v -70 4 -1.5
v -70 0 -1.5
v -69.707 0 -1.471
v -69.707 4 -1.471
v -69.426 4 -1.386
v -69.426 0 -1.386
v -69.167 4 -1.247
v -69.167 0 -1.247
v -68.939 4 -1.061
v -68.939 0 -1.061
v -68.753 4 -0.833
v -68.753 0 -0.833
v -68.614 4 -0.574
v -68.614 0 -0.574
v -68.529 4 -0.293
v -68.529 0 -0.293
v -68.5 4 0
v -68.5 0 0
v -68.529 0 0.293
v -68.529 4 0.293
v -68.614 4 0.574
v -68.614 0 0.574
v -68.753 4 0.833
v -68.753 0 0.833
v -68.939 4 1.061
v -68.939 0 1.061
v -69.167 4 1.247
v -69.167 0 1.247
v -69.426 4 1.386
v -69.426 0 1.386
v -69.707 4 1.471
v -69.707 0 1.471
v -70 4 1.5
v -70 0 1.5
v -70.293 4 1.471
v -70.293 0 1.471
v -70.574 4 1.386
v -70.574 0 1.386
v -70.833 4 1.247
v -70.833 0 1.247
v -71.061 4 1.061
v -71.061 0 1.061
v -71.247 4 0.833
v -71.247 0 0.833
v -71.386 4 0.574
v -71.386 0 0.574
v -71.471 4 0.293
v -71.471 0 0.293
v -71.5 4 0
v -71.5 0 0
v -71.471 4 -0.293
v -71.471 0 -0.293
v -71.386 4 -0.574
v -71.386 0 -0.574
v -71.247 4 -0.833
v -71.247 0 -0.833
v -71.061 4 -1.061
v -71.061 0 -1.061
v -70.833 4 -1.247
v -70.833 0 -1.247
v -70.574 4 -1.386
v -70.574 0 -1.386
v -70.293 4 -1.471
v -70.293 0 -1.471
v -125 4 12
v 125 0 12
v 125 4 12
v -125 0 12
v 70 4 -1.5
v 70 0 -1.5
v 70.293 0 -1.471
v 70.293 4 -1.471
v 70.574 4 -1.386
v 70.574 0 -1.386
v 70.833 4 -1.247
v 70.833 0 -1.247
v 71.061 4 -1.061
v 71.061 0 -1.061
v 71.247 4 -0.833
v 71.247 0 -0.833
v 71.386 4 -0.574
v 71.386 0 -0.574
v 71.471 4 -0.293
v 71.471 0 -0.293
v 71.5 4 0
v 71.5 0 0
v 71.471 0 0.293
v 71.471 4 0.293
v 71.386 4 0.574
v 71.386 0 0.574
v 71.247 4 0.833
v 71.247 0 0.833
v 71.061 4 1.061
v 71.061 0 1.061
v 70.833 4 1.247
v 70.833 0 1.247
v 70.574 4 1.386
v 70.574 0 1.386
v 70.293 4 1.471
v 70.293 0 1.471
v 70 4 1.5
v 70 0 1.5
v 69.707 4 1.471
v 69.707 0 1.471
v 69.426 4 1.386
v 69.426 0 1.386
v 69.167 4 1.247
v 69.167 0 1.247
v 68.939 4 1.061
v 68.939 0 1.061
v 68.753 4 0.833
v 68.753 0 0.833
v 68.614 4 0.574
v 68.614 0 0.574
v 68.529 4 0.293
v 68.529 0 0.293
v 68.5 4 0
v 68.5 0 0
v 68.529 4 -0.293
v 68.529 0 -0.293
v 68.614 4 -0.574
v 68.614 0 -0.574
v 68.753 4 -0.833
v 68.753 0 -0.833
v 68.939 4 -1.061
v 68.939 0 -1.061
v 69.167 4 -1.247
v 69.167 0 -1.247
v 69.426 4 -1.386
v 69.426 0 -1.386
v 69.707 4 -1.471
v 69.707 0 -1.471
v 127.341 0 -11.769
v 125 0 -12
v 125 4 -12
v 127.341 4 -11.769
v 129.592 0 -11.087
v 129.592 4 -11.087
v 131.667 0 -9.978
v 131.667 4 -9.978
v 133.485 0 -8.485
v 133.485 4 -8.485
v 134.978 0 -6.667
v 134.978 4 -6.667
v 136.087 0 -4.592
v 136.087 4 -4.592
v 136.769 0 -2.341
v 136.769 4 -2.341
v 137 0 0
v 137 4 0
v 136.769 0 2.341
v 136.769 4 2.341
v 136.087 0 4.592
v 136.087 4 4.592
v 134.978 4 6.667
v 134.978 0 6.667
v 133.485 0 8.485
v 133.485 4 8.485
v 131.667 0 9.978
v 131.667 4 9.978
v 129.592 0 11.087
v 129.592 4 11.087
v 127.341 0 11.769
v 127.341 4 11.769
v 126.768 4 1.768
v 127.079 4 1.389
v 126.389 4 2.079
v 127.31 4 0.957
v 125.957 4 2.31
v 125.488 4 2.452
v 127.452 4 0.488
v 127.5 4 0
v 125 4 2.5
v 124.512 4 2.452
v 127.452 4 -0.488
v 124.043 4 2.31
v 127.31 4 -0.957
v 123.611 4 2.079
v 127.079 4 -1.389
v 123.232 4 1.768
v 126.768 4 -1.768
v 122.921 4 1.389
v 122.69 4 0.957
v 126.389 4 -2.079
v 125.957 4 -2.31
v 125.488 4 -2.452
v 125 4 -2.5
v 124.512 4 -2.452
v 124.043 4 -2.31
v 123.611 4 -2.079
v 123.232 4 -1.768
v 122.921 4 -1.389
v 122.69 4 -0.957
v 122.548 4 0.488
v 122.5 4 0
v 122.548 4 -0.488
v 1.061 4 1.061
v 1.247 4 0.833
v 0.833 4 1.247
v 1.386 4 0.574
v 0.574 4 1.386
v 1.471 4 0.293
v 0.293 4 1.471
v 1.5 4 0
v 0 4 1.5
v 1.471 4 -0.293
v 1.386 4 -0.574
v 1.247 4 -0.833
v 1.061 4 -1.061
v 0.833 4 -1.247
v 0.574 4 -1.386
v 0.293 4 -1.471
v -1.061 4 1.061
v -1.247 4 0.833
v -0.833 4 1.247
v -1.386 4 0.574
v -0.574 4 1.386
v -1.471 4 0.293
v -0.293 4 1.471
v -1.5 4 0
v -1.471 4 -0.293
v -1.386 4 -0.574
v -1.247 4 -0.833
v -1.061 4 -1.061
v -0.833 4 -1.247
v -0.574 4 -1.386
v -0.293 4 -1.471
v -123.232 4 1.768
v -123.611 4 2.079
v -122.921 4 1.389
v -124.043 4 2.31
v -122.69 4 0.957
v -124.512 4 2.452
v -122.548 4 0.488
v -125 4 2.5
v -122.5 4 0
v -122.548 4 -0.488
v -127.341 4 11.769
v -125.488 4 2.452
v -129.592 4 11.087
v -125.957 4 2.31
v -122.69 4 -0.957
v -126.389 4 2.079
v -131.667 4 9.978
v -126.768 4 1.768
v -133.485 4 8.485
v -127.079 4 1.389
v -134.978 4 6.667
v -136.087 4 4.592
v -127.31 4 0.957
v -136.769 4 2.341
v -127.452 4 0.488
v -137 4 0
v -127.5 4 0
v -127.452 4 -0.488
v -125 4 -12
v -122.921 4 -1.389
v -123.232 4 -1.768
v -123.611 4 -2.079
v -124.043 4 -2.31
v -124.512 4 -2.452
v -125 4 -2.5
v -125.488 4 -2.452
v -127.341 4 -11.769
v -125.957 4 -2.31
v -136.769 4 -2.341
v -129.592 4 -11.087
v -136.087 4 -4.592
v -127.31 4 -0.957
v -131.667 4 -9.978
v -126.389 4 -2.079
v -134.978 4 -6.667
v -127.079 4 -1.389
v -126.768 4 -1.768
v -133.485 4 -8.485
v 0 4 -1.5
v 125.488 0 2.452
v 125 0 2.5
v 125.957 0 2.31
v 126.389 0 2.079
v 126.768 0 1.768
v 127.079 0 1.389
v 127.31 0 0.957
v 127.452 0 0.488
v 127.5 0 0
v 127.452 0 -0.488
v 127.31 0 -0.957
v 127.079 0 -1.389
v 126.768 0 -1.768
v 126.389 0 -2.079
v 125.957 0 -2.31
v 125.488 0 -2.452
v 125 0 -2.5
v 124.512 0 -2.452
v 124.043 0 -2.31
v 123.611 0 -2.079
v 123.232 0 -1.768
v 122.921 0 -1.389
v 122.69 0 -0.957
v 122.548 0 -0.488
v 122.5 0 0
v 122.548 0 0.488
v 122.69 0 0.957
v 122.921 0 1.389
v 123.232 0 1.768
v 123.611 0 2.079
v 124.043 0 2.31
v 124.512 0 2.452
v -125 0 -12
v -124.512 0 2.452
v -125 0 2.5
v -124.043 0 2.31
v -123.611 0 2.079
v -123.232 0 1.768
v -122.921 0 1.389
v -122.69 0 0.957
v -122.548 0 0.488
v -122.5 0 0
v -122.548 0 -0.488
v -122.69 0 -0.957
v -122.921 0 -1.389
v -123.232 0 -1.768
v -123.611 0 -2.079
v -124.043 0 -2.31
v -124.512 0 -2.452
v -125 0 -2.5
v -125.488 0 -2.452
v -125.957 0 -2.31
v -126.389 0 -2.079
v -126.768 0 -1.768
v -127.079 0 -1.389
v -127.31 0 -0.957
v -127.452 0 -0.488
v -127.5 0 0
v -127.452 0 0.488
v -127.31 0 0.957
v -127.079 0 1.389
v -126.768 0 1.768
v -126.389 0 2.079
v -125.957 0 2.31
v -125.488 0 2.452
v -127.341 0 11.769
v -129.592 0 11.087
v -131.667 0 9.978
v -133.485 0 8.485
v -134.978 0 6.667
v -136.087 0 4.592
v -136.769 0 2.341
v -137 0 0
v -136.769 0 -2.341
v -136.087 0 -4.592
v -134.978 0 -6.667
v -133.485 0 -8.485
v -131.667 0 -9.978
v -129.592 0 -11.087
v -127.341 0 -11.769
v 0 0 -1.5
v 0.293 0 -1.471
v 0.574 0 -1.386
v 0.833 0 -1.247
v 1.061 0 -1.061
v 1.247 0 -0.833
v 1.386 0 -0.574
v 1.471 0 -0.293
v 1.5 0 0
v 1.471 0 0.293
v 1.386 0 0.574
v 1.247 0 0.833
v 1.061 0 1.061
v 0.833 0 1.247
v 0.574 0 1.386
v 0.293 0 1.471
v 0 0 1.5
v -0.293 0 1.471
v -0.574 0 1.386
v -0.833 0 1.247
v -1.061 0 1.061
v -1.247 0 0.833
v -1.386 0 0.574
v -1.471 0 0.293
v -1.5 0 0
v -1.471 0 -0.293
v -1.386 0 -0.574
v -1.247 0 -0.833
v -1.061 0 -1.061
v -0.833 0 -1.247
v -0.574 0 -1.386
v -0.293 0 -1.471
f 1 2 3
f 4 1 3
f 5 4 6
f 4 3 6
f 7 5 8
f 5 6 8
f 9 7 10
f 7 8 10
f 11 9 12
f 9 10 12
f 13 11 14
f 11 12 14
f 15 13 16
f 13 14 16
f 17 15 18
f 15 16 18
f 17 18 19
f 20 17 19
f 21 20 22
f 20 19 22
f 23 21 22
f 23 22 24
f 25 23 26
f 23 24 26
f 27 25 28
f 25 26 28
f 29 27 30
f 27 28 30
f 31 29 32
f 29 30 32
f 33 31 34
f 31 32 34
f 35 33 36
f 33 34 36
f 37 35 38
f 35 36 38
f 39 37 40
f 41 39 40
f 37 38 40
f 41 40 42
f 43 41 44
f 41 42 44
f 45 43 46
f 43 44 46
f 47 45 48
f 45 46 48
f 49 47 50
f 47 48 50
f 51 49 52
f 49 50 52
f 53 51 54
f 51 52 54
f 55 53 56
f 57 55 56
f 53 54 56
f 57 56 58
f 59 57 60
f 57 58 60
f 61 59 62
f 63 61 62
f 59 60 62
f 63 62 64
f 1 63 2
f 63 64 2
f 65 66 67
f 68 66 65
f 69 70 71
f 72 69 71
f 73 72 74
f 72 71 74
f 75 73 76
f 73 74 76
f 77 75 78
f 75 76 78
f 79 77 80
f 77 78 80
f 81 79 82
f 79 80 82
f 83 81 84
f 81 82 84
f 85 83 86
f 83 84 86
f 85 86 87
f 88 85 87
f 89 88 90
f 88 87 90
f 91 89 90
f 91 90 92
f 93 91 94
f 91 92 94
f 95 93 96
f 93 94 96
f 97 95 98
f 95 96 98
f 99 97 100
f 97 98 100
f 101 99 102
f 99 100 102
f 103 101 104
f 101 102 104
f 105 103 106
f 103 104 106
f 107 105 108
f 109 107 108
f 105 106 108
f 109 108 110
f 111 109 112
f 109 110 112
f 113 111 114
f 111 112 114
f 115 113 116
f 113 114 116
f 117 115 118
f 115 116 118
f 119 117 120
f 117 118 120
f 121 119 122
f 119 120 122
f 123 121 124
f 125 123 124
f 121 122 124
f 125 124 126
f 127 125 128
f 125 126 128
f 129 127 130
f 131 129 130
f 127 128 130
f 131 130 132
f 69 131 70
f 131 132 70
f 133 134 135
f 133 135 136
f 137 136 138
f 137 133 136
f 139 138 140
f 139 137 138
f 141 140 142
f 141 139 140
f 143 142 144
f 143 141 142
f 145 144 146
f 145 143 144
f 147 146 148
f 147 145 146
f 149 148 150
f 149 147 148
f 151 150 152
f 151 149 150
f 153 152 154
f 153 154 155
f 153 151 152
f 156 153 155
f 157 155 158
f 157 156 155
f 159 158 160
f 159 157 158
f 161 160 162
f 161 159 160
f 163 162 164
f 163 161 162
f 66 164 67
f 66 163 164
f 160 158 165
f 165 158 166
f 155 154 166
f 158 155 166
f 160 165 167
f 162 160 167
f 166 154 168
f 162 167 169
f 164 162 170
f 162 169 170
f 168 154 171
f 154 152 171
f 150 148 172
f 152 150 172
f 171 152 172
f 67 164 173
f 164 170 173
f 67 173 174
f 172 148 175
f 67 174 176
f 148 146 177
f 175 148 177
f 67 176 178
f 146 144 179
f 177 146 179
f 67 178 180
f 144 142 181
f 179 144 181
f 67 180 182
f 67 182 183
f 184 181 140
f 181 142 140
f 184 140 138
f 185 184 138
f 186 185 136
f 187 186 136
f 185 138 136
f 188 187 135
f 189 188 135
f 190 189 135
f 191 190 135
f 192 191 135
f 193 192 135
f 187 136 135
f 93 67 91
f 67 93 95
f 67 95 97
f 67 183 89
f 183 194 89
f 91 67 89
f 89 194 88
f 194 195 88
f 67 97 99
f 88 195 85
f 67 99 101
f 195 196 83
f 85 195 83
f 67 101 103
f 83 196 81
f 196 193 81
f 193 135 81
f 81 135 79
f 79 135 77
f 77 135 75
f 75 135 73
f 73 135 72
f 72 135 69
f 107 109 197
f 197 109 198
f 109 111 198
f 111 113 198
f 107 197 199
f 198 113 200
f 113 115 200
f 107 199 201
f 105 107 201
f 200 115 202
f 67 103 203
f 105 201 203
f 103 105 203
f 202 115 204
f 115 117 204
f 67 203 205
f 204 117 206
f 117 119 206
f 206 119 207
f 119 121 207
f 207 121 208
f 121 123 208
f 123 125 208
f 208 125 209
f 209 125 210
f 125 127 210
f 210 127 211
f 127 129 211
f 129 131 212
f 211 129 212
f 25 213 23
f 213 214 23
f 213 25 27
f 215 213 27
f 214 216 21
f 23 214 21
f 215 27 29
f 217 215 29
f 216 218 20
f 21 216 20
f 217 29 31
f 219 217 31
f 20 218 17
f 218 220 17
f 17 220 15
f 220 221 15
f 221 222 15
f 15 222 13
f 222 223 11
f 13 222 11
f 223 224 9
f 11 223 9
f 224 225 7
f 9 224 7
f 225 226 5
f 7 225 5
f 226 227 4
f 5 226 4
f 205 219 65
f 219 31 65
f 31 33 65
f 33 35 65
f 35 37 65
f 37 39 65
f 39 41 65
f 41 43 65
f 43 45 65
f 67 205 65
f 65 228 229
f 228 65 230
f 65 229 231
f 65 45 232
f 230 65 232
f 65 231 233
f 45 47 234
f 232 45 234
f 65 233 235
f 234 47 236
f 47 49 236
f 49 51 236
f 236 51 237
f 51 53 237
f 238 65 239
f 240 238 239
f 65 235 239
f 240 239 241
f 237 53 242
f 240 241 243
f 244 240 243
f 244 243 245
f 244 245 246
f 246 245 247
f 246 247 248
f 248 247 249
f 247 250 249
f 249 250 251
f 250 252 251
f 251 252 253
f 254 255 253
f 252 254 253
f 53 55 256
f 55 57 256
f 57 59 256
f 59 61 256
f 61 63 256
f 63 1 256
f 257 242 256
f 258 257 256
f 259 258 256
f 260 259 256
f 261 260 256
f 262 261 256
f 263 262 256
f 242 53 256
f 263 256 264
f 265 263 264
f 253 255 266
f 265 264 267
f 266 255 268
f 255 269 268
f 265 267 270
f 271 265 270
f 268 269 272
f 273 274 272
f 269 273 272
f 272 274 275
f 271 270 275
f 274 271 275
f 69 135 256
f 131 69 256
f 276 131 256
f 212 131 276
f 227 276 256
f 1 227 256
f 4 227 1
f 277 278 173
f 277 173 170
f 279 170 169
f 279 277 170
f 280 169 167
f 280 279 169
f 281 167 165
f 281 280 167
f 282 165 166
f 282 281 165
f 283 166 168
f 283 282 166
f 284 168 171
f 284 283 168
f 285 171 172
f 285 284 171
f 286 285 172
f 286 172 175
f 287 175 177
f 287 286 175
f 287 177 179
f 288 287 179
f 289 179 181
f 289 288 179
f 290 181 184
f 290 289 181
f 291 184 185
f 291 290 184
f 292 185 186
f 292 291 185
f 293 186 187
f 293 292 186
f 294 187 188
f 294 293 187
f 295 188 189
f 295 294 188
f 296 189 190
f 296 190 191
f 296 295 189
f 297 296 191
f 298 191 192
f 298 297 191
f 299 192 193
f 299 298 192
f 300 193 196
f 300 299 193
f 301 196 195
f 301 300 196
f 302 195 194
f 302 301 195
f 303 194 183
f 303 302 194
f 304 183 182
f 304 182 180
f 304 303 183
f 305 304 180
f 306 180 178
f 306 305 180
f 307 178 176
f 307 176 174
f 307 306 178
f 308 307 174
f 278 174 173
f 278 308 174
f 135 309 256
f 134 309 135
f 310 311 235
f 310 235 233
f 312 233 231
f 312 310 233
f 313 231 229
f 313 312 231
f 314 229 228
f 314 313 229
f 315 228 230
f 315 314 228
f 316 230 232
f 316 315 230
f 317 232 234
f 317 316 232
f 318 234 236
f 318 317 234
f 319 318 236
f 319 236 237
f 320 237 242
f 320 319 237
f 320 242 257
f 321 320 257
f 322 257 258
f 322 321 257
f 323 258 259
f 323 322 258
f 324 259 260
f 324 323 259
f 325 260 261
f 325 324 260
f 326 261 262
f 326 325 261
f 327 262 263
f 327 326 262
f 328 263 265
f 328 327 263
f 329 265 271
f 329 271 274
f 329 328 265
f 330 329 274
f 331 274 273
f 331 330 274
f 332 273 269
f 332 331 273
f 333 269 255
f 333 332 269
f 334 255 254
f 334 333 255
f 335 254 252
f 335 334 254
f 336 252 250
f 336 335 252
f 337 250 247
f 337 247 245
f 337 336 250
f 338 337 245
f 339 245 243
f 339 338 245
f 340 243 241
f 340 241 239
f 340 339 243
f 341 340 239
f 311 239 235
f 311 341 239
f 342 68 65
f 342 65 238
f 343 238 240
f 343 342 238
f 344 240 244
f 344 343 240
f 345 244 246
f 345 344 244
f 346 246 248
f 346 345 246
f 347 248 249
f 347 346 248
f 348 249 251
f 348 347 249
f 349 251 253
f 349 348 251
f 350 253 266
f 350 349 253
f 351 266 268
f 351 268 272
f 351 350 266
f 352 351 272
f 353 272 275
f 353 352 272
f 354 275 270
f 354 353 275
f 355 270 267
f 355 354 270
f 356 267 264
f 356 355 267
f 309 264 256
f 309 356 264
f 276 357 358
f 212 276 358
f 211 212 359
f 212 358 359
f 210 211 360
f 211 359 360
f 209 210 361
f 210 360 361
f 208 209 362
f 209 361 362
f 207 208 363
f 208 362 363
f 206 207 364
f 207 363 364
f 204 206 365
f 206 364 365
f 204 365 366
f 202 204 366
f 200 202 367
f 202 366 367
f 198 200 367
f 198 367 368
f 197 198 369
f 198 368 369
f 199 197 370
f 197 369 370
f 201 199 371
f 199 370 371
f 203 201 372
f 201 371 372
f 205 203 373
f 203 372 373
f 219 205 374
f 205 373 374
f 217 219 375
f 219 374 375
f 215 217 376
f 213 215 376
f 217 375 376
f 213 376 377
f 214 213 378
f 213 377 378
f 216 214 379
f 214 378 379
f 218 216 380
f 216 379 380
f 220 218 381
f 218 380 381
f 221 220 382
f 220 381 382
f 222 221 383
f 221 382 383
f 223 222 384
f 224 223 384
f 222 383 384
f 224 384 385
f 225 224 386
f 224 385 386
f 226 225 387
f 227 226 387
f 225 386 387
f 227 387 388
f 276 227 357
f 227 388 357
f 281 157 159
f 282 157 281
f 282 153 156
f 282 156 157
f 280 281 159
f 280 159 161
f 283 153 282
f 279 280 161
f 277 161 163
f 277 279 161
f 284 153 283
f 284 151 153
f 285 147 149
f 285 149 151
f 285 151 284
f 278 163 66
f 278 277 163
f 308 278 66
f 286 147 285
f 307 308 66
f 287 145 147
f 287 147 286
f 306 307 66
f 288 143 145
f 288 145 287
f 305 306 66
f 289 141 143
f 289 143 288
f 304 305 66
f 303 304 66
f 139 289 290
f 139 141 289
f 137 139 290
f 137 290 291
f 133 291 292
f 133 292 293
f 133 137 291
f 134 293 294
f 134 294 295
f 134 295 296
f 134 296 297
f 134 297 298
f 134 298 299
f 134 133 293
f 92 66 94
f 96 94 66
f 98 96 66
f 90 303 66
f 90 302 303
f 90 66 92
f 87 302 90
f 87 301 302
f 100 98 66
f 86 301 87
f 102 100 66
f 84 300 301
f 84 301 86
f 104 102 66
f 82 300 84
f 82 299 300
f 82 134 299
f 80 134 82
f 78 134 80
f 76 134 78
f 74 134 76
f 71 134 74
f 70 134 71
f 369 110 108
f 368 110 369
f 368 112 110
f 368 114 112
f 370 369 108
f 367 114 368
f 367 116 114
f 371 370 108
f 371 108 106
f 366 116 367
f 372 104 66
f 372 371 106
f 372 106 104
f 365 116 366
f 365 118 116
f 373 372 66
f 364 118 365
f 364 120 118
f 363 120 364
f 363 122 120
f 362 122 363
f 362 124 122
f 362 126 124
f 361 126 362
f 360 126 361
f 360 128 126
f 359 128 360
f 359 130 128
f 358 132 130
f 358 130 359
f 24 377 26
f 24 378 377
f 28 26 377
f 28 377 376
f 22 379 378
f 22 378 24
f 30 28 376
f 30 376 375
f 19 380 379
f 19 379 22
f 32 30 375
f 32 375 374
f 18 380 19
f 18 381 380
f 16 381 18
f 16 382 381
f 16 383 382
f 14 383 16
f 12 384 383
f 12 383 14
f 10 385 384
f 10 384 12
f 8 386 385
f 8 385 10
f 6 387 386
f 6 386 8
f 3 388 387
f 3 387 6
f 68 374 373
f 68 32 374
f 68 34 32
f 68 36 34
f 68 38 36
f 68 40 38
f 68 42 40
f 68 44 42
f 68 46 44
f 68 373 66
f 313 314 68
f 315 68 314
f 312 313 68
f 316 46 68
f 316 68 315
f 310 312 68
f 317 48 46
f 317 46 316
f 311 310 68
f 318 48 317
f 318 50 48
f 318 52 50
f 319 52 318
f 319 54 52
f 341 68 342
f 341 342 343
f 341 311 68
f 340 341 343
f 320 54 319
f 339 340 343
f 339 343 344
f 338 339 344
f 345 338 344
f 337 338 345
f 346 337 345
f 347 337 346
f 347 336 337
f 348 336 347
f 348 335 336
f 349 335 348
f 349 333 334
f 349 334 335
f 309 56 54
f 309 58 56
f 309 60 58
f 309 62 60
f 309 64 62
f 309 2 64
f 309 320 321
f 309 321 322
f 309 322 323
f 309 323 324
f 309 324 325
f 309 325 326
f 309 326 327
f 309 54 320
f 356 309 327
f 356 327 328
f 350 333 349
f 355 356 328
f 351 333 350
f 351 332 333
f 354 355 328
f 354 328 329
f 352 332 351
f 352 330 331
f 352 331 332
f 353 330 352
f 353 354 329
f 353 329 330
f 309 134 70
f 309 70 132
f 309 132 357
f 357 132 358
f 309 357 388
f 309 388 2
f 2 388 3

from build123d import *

# Parameters (mm, degrees)
SKETCH_1_R          = 2.5
EXTRUDE_1_DEPTH     = 4
SKETCH_2_R          = 1.5
CUT_EXTRUDE_1_DEPTH = 4


with BuildPart() as part:
    # 草图1 → 凸台-拉伸1 (new body)
    with BuildSketch(Plane(origin=(0, 0, 0), x_dir=(1, 0, 0), z_dir=(0, 1, 0))):
        with BuildLine():
            Line((-125, 12), (125, 12))
            ThreePointArc((125, 12), (137, 0), (125, -12))
            Line((125, -12), (-125, -12))
            ThreePointArc((-125, -12), (-137, 0), (-125, 12))
        make_face()
        with Locations(Location((125, 0, 0), (0, 0, 270))):
            Circle(SKETCH_1_R, mode=Mode.SUBTRACT)
        with Locations(Location((-125, 0, 0), (0, 0, 270))):
            Circle(SKETCH_1_R, mode=Mode.SUBTRACT)
    extrude(amount=EXTRUDE_1_DEPTH)

    # 草图2 → 切除-拉伸1 (cut)
    with BuildSketch(Plane.XZ):
        with Locations(Location((-70, 0, 0), (0, 0, 270))):
            Circle(SKETCH_2_R)
        with Locations(Location((0, 0, 0), (0, 0, 270))):
            Circle(SKETCH_2_R)
        with Locations(Location((70, 0, 0), (0, 0, 270))):
            Circle(SKETCH_2_R)
    extrude(amount=-CUT_EXTRUDE_1_DEPTH, mode=Mode.SUBTRACT)


solid = part.part
